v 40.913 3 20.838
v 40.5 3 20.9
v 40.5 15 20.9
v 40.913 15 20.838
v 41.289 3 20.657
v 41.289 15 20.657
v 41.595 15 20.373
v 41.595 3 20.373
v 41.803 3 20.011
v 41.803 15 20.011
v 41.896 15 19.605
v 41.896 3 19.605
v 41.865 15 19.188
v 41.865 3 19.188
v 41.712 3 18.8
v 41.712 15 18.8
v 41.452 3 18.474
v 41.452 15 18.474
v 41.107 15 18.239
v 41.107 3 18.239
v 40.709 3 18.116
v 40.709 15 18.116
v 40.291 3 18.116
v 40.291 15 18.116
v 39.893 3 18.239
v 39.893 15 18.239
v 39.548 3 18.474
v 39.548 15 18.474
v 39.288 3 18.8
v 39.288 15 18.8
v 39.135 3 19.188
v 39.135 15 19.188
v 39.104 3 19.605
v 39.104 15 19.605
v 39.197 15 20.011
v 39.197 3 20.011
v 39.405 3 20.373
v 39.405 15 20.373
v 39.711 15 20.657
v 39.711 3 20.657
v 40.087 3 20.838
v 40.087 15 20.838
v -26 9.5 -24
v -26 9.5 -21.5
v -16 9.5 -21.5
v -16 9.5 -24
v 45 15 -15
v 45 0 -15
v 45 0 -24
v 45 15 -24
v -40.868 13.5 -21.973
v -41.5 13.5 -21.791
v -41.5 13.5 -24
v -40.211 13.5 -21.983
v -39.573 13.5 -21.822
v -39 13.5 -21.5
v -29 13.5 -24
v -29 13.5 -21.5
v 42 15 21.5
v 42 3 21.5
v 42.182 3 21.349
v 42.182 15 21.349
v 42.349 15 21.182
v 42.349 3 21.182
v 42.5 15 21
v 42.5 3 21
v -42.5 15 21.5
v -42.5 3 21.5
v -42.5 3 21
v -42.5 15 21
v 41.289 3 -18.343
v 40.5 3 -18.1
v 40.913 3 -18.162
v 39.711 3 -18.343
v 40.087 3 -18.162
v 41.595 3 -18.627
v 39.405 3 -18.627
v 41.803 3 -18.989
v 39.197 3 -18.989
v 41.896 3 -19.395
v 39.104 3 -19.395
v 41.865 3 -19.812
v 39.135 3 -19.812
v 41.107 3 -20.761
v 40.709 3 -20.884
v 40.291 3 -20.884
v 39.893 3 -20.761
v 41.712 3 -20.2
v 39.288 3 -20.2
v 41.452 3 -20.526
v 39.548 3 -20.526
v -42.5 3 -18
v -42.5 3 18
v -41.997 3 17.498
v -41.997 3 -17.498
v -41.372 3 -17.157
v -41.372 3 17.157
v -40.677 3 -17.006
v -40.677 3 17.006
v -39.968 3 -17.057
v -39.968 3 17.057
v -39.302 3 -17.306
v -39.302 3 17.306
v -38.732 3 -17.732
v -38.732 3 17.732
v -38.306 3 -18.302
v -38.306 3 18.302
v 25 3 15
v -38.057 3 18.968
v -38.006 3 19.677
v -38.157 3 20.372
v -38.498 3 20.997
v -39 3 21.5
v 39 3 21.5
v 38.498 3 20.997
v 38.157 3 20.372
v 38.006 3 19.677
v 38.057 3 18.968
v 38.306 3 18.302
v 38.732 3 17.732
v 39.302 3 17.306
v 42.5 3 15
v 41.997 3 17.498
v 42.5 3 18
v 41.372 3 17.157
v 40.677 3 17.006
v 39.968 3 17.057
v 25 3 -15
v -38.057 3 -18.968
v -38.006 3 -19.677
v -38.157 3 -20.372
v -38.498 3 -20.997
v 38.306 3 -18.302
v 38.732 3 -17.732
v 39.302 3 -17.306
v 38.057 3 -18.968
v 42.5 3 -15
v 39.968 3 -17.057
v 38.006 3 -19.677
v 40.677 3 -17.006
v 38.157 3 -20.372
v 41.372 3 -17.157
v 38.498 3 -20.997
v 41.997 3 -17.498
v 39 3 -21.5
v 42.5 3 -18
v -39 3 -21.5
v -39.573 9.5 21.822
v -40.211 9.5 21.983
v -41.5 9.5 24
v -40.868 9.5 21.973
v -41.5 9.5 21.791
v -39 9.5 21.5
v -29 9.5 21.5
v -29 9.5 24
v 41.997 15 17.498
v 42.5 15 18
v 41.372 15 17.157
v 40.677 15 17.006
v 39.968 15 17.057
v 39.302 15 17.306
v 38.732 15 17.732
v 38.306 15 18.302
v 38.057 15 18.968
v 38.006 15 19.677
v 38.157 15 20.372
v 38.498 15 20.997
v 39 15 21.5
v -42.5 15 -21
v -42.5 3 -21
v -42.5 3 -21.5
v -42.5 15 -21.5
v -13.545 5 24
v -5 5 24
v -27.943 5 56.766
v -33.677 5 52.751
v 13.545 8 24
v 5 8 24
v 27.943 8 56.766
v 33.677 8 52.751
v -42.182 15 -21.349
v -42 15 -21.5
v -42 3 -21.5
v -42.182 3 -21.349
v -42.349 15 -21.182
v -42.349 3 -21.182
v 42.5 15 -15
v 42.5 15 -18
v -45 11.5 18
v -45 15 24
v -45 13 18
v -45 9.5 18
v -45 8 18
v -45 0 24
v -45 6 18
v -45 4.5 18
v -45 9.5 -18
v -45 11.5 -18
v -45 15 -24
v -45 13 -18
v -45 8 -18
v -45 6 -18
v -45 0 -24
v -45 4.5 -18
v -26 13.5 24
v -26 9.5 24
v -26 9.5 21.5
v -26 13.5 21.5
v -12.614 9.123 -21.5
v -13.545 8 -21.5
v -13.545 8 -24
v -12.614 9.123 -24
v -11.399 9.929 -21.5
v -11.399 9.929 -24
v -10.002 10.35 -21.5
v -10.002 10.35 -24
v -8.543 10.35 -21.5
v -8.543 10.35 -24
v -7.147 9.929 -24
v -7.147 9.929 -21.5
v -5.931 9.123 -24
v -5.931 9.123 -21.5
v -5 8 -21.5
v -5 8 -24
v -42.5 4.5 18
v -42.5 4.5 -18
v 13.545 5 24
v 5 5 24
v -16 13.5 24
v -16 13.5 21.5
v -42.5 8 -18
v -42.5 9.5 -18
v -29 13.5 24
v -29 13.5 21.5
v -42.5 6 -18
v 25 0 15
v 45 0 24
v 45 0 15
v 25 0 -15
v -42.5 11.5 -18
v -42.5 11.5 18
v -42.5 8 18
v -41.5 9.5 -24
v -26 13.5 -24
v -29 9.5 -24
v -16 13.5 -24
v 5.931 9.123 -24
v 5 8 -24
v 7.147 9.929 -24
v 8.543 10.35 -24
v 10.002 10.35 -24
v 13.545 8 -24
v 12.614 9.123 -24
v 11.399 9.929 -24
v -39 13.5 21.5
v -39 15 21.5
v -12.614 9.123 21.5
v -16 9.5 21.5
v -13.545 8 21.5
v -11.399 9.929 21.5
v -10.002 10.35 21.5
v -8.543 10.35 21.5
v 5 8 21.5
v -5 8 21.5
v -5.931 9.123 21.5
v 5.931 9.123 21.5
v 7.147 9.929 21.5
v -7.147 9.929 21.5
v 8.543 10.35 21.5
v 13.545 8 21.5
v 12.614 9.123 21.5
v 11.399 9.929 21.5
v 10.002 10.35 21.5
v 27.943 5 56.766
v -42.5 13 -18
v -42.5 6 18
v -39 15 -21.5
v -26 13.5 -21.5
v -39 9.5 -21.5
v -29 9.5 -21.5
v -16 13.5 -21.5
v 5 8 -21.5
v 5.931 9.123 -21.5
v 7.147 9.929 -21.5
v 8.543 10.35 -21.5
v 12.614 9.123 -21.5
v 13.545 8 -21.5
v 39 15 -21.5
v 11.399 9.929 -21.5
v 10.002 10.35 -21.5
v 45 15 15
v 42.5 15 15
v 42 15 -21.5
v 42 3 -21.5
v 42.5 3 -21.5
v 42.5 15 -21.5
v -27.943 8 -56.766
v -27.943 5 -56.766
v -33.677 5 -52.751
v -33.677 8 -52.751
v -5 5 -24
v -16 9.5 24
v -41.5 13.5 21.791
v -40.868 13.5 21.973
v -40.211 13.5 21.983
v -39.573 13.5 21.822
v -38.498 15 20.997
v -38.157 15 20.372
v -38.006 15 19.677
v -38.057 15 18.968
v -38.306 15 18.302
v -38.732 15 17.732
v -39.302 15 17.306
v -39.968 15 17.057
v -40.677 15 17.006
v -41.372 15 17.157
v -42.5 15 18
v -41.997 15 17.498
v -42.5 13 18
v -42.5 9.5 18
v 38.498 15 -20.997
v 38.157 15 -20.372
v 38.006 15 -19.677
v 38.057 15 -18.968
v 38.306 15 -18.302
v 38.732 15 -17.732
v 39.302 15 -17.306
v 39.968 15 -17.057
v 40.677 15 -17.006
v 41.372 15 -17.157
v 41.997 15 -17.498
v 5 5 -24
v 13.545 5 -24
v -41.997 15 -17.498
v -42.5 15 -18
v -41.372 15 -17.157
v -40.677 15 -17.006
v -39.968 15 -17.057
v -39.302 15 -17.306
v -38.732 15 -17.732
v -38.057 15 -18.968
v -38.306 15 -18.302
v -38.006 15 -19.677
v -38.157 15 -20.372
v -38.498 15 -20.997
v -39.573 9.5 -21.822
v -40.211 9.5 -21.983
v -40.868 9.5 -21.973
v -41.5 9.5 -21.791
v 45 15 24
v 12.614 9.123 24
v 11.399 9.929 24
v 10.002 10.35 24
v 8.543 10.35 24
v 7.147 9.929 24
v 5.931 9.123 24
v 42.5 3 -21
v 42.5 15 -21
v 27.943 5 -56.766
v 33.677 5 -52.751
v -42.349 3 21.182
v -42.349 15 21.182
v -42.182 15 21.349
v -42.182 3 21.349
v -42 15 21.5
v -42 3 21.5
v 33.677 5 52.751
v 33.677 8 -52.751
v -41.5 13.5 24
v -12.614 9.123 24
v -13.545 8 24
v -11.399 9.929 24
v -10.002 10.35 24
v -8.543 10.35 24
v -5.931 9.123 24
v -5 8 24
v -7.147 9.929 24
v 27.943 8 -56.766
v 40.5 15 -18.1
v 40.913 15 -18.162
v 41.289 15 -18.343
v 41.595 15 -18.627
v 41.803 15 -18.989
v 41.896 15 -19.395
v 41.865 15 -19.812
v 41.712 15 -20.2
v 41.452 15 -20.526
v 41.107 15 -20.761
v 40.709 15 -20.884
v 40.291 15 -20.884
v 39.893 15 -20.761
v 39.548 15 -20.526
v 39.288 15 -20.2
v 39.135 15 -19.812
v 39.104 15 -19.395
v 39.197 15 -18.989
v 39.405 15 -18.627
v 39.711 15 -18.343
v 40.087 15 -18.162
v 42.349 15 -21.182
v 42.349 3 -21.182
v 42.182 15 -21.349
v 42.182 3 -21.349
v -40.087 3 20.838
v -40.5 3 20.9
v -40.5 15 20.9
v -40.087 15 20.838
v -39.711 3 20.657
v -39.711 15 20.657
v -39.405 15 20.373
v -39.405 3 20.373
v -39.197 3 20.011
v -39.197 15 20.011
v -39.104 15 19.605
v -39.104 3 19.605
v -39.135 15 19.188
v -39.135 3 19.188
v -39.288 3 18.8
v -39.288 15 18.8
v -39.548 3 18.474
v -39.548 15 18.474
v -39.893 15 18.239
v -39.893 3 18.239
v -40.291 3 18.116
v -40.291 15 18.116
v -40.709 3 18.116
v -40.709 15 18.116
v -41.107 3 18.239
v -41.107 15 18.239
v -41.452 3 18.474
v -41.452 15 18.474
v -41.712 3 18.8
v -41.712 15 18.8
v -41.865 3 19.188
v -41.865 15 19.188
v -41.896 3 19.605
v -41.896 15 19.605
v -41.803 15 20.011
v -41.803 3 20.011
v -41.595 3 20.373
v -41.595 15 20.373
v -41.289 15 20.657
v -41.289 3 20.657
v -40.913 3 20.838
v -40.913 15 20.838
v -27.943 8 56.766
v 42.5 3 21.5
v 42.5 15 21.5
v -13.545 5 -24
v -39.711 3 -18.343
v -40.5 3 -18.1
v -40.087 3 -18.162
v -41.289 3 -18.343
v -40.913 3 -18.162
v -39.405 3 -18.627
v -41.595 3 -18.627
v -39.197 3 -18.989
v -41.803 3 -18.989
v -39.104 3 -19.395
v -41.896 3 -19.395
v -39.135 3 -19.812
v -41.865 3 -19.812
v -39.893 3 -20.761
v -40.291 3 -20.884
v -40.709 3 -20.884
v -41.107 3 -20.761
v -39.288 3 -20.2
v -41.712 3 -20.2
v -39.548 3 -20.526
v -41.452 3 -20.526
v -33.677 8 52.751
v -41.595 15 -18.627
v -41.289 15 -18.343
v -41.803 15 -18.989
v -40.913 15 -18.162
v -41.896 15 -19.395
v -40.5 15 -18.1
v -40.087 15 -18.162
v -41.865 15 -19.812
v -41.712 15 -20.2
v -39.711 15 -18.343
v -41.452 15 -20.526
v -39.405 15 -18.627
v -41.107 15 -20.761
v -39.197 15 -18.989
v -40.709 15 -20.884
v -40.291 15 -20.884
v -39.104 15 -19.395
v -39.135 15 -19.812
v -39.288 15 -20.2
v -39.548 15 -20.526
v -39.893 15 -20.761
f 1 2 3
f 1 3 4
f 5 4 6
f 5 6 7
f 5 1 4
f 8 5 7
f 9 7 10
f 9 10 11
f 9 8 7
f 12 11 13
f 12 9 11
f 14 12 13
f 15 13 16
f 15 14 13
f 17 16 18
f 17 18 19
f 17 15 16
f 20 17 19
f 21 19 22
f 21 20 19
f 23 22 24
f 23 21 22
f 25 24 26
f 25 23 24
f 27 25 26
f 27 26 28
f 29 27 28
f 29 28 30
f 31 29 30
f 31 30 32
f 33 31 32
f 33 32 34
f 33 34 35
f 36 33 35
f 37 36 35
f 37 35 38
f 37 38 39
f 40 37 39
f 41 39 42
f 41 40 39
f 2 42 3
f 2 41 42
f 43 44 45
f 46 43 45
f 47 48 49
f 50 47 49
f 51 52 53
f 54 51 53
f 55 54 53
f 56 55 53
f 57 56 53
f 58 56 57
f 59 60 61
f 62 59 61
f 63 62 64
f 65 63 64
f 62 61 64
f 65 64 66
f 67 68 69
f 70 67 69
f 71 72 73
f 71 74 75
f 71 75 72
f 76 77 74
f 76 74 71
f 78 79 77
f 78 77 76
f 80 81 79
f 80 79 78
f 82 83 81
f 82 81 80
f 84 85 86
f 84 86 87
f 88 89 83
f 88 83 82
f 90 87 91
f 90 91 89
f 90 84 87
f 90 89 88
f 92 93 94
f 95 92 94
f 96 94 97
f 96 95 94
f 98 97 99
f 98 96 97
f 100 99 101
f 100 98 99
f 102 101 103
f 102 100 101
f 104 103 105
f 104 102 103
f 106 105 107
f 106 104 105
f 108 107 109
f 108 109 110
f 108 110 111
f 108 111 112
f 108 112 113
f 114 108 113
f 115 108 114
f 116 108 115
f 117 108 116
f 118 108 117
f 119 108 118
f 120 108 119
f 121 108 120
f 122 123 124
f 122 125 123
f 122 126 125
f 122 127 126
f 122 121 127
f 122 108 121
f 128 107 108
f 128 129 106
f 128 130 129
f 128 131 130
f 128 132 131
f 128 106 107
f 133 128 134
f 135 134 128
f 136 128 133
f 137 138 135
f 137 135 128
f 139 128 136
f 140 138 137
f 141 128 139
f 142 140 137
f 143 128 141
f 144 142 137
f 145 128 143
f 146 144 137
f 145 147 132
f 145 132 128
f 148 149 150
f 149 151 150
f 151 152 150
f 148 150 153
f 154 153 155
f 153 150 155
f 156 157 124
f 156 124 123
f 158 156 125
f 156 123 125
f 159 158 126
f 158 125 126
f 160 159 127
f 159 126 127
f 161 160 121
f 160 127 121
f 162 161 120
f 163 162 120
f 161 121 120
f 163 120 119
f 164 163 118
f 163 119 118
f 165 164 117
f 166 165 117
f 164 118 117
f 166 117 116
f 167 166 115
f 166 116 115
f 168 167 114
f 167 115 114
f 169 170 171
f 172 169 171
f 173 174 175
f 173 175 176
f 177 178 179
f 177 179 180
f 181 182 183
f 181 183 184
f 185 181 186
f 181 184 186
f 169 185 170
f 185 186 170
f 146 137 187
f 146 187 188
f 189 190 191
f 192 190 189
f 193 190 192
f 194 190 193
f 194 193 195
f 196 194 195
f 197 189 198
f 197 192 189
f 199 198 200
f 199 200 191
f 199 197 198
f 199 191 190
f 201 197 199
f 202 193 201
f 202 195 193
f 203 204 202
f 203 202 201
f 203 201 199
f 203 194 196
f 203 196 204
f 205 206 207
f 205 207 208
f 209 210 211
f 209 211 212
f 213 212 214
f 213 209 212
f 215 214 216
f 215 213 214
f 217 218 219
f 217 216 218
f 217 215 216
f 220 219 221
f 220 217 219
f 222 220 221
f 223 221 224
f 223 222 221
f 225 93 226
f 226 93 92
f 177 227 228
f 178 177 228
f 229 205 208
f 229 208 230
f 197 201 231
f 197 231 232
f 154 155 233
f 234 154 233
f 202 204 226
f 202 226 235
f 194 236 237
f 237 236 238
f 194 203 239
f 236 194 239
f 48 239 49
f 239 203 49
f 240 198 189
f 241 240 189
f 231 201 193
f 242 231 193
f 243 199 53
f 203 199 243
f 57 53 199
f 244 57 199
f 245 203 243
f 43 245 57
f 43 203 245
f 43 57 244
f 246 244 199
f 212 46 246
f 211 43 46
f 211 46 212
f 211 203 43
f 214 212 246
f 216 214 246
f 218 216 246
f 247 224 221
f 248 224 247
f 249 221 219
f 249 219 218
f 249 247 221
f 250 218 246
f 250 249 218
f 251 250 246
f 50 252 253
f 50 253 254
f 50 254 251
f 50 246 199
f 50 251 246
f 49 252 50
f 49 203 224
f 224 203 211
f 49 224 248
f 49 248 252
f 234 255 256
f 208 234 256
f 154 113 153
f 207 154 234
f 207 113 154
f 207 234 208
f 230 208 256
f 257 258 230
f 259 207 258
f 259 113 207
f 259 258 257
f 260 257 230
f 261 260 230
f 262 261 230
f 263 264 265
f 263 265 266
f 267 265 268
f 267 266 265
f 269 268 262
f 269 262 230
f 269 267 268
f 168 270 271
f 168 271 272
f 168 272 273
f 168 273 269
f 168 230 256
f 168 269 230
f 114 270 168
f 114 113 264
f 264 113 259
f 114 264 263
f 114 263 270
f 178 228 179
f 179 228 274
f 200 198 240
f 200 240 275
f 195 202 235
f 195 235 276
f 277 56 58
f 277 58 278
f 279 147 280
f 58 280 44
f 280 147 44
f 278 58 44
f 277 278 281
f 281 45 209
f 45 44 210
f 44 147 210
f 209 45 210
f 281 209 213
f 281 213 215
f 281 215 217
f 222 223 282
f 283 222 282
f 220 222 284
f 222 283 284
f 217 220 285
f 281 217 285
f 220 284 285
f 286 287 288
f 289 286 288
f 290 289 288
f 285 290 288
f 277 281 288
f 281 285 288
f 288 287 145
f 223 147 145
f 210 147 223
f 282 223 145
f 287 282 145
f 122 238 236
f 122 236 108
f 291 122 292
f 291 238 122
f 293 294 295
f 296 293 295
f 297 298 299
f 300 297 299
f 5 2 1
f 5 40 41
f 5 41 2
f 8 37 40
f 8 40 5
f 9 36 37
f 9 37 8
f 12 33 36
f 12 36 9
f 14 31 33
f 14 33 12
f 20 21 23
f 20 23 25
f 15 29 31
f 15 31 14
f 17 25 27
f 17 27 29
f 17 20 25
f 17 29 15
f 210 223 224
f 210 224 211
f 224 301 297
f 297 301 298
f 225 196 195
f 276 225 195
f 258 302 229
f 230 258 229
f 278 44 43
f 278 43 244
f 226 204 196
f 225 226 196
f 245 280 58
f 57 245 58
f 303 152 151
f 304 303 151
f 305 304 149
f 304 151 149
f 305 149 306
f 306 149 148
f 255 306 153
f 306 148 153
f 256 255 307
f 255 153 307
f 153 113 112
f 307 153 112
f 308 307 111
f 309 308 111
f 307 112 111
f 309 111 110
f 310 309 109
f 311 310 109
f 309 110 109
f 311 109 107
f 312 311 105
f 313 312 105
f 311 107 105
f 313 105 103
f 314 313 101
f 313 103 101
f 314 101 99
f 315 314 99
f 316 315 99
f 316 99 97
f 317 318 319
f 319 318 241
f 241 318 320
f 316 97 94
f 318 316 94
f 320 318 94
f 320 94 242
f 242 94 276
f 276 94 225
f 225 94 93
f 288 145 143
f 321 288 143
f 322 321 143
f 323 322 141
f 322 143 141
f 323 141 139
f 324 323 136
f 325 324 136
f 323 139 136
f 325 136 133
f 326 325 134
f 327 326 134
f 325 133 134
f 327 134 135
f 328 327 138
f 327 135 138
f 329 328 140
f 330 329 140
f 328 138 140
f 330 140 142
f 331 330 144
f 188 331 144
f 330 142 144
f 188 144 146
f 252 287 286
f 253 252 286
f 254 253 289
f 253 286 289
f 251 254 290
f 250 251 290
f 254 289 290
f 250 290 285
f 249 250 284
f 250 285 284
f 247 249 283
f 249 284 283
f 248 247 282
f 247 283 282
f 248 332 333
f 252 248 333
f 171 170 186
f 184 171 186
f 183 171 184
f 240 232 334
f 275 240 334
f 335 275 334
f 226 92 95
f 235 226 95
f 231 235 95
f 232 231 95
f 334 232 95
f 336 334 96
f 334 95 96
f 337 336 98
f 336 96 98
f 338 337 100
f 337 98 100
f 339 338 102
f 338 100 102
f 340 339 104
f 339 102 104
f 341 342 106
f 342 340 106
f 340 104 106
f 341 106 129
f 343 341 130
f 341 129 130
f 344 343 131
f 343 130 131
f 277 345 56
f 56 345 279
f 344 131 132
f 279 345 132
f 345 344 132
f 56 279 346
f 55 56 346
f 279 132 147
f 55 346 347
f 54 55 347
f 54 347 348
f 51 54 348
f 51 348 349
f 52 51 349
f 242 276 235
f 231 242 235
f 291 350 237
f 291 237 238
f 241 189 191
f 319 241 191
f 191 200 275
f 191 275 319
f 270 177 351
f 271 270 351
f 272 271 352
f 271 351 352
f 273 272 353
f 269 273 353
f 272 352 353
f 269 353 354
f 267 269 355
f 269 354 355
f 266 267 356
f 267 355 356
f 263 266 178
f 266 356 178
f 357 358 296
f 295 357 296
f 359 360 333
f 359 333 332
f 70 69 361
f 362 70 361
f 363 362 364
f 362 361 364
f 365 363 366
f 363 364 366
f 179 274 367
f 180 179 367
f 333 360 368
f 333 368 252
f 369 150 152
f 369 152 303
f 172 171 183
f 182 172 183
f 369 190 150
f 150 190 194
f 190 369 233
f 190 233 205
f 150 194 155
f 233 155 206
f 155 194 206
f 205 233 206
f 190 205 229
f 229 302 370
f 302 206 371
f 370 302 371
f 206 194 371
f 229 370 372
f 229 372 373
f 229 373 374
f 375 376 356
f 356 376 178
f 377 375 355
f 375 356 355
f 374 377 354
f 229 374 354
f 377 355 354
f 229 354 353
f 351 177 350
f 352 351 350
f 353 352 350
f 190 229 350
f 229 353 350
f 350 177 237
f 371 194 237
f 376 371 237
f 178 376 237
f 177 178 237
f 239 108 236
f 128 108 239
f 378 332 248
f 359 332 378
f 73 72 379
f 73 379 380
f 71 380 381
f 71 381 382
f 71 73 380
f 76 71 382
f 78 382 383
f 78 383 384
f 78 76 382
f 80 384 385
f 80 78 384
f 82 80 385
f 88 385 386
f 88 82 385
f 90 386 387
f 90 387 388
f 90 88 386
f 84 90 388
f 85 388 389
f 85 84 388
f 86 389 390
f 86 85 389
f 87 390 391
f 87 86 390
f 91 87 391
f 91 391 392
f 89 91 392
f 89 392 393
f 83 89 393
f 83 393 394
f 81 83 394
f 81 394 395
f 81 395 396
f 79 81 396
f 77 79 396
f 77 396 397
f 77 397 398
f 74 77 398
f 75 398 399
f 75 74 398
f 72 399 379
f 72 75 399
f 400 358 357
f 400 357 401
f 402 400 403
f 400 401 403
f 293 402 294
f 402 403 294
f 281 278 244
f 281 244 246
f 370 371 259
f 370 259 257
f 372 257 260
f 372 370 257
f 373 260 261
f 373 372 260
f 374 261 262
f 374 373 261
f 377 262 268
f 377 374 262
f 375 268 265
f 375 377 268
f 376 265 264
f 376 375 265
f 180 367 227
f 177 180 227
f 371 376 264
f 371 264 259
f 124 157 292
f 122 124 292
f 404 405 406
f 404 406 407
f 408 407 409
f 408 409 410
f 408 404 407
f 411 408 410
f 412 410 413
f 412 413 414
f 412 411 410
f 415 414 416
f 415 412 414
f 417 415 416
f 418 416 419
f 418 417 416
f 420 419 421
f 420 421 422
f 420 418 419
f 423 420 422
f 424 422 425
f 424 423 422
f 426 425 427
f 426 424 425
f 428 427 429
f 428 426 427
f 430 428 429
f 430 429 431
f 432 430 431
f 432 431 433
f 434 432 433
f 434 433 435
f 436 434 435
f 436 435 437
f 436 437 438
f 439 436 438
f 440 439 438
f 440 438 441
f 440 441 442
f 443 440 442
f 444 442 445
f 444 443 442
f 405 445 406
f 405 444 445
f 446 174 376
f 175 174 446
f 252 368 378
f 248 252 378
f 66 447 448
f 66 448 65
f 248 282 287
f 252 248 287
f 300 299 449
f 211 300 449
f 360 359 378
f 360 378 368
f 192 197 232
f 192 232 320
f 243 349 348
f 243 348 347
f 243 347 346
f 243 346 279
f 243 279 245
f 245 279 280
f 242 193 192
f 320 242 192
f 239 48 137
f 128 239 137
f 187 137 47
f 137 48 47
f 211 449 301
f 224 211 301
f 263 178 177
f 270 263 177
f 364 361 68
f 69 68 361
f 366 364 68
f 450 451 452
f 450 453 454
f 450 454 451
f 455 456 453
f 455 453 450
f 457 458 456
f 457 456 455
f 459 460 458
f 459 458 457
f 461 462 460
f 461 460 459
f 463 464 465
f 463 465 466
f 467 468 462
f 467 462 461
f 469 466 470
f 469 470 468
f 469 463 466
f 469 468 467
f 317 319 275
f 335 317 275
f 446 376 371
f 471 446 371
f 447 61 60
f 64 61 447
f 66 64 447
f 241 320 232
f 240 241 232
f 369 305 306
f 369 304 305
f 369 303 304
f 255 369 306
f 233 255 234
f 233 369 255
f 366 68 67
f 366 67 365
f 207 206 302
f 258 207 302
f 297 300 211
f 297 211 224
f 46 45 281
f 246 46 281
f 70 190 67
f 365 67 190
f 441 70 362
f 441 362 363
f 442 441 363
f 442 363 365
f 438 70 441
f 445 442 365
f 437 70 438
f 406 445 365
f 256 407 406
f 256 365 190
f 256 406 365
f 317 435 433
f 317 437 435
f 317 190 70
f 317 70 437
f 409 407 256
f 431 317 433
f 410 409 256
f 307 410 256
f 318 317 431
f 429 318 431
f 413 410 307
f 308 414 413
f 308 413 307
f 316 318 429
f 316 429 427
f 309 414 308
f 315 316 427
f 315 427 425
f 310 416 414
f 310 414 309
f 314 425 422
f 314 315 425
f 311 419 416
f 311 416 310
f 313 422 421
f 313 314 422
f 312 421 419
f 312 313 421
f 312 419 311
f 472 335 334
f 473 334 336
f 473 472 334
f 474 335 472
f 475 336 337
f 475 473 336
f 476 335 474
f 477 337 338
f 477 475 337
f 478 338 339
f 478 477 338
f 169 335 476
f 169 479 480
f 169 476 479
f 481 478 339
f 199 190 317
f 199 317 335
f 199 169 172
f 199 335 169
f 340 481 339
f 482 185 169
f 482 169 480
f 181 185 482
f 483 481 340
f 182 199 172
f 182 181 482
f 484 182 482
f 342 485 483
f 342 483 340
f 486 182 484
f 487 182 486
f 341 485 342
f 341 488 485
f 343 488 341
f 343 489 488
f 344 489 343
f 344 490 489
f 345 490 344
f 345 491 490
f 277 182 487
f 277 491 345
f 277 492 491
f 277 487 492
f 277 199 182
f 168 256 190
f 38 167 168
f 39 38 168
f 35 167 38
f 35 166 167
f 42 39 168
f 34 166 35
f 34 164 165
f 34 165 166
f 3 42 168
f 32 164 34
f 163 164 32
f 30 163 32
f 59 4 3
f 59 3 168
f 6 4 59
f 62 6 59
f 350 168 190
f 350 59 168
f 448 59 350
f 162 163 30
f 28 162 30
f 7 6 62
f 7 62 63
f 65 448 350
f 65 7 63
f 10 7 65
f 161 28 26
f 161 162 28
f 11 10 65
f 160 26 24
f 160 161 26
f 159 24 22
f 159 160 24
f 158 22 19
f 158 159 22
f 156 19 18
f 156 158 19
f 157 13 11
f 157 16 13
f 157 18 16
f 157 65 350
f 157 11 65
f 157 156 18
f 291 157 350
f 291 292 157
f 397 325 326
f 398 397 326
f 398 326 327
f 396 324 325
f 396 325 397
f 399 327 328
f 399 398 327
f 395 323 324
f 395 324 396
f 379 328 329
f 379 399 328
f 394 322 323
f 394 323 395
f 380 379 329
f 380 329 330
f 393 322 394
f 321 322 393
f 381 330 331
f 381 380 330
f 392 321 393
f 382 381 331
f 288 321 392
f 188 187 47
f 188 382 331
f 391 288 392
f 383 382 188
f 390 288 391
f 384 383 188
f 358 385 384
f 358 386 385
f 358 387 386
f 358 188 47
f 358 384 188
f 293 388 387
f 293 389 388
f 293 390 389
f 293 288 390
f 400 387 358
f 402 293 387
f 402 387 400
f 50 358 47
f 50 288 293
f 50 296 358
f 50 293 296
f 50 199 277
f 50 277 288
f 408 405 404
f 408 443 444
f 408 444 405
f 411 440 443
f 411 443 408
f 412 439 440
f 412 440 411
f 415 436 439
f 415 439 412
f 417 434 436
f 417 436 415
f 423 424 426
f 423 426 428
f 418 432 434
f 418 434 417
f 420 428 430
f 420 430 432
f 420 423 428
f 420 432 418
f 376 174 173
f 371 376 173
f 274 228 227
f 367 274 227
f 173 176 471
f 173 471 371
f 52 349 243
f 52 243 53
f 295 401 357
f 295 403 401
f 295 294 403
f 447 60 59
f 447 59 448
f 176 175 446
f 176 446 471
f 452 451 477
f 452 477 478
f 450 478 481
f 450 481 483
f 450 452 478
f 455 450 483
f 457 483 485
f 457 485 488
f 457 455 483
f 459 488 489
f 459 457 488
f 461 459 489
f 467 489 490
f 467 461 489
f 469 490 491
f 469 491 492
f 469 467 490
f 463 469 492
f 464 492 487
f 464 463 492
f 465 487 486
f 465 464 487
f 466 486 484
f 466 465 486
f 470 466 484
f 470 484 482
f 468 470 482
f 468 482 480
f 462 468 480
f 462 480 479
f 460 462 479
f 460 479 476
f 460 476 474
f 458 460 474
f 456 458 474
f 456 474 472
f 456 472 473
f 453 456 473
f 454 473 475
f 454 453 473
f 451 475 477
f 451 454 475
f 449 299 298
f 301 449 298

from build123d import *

# Parameters (mm, degrees)
SKICA1_W                  = 90
SKICA1_H                  = 48
P_IDAT_VYSUNUT_M1_DEPTH   = 3
P_IDAT_START              = 5
P_IDAT_VYSUNUT_M2_DEPTH   = 3
P_IDAT_VYSUNUT_M2_2_DEPTH = 3
P_IDAT_VYSUNUT_M2_3_DEPTH = 3
P_IDAT_VYSUNUT_M2_4_DEPTH = 3
SKICA3_W                  = 90
SKICA3_H                  = 48
SKICA3_W_2                = 85
SKICA3_H_2                = 43
P_IDAT_VYSUNUT_M3_DEPTH   = 12
SKICA4_W                  = 30
SKICA4_H                  = 15
ODEBRAT_VYSUNUT_M1_DEPTH  = 20
SKICA10_W                 = 12.5
SKICA10_H                 = 4
SKICA10_W_2               = 10
ODEBRAT_VYSUNUT_M5_DEPTH  = 50
SKICA11_W                 = 36
SKICA11_H                 = 1.5
ODEBRAT_VYSUNUT_M6_DEPTH  = 5
ODEBRAT_VYSUNUT_M7_DEPTH  = 50
SKICA14_R                 = 2.5
SKICA14_R_2               = 1.4
P_IDAT_VYSUNUT_M4_DEPTH   = 12


with BuildPart() as part:
    # Skica1 → Přidat vysunutím1 (new body)
    with BuildSketch(Plane(origin=(0, 0, 0), x_dir=(1, 0, 0), z_dir=(0, 1, 0))):
        Rectangle(SKICA1_W, SKICA1_H)
    extrude(amount=P_IDAT_VYSUNUT_M1_DEPTH)

    # Skica3 → Přidat vysunutím3 (add)
    with BuildSketch(Plane(origin=(0, 3, 0), x_dir=(1, 0, 0), z_dir=(0, 1, 0))):
        Rectangle(SKICA3_W, SKICA3_H)
        Rectangle(SKICA3_W_2, SKICA3_H_2, mode=Mode.SUBTRACT)
    extrude(amount=P_IDAT_VYSUNUT_M3_DEPTH)

    # Skica4 → Odebrat vysunutím1 (cut)
    with BuildSketch(Plane(origin=(45, 0, 0), x_dir=(0, 0, -1), z_dir=(1, 0, 0))):
        with Locations((0, 7.5)):
            Rectangle(SKICA4_W, SKICA4_H)
    extrude(amount=-ODEBRAT_VYSUNUT_M1_DEPTH, mode=Mode.SUBTRACT)

    # Skica10 → Odebrat vysunutím5 (cut)
    with BuildSketch(Plane.XY.offset(24)):
        with Locations((-35.25, 11.5)):
            Rectangle(SKICA10_W, SKICA10_H)
        with Locations((-21, 11.5)):
            Rectangle(SKICA10_W_2, SKICA10_H)
    extrude(amount=-ODEBRAT_VYSUNUT_M5_DEPTH, mode=Mode.SUBTRACT)

    # Skica11 → Odebrat vysunutím6 (cut)
    with BuildSketch(Plane.ZY.offset(45)):
        with Locations((0, 12.25)):
            Rectangle(SKICA11_W, SKICA11_H)
        with Locations((0, 8.75)):
            Rectangle(SKICA11_W, SKICA11_H)
        with Locations((0, 5.25)):
            Rectangle(SKICA11_W, SKICA11_H)
    extrude(amount=-ODEBRAT_VYSUNUT_M6_DEPTH, mode=Mode.SUBTRACT)

    # Skica12 → Odebrat vysunutím7 (cut)
    with BuildSketch(Plane.XY.offset(24)):
        with BuildLine():
            Line((-5, 8), (-13.545422121, 8))
            ThreePointArc((-13.545422121, 8), (-9.272711061, 10.403090261), (-5, 8))
        make_face()
        with BuildLine():
            Line((5, 8), (13.545422121, 8))
            ThreePointArc((13.545422121, 8), (9.272711061, 10.403090261), (5, 8))
        make_face()
    extrude(amount=-ODEBRAT_VYSUNUT_M7_DEPTH, mode=Mode.SUBTRACT)

    # Skica14 → Přidat vysunutím4 (add)
    # profile 1 of 4: a face of its own
    with BuildSketch(Plane(origin=(0, 3, 0), x_dir=(1, 0, 0), z_dir=(0, 1, 0))):
        with Locations((-40.5, 19.5)):
            Circle(SKICA14_R)
        with Locations(Location((-40.5, 19.5, 0), (0, 0, 270))):
            Circle(SKICA14_R_2, mode=Mode.SUBTRACT)
    # profile 2 of 4: a face of its own
    with BuildSketch(Plane(origin=(0, 3, 0), x_dir=(1, 0, 0), z_dir=(0, 1, 0))):
        with Locations((-40.5, -19.5)):
            Circle(SKICA14_R)
        with Locations(Location((-40.5, -19.5, 0), (0, 0, 270))):
            Circle(SKICA14_R_2, mode=Mode.SUBTRACT)
    # profile 3 of 4: a face of its own
    with BuildSketch(Plane(origin=(0, 3, 0), x_dir=(1, 0, 0), z_dir=(0, 1, 0))):
        with Locations((40.5, -19.5)):
            Circle(SKICA14_R)
        with Locations(Location((40.5, -19.5, 0), (0, 0, 270))):
            Circle(SKICA14_R_2, mode=Mode.SUBTRACT)
    # profile 4 of 4: a face of its own
    with BuildSketch(Plane(origin=(0, 3, 0), x_dir=(1, 0, 0), z_dir=(0, 1, 0))):
        with Locations((40.5, 19.5)):
            Circle(SKICA14_R)
        with Locations(Location((40.5, 19.5, 0), (0, 0, 270))):
            Circle(SKICA14_R_2, mode=Mode.SUBTRACT)
    extrude(amount=P_IDAT_VYSUNUT_M4_DEPTH)


with BuildPart() as body_2:
    # Skica2 → Přidat vysunutím2 (new body)
    with BuildSketch(Plane(origin=(0, 0, 0), x_dir=(1, 0, 0), z_dir=(0, 1, 0)).offset(P_IDAT_START)):
        Polygon((-33.677121764, -52.751046717), (-13.545422121, -24), (-11.103872944, -24), (-5, -24), (-27.943057454, -56.766081772), align=None)
    extrude(amount=P_IDAT_VYSUNUT_M2_DEPTH)


with BuildPart() as body_3:
    # Skica2 → P_idat vysunut_m2 2 (new body)
    with BuildSketch(Plane(origin=(0, 0, 0), x_dir=(1, 0, 0), z_dir=(0, 1, 0)).offset(P_IDAT_START)):
        Polygon((5, -24), (27.943057454, -56.766081772), (33.677121764, -52.751046717), (13.545422121, -24), (11.103872944, -24), align=None)
    extrude(amount=P_IDAT_VYSUNUT_M2_2_DEPTH)


with BuildPart() as body_4:
    # Skica2 → P_idat vysunut_m2 3 (new body)
    with BuildSketch(Plane(origin=(0, 0, 0), x_dir=(1, 0, 0), z_dir=(0, 1, 0)).offset(P_IDAT_START)):
        Polygon((-5, 24), (-27.943057454, 56.766081772), (-33.677121764, 52.751046717), (-13.545422121, 24), (-11.103872944, 24), align=None)
    extrude(amount=P_IDAT_VYSUNUT_M2_3_DEPTH)


with BuildPart() as body_5:
    # Skica2 → P_idat vysunut_m2 4 (new body)
    with BuildSketch(Plane(origin=(0, 0, 0), x_dir=(1, 0, 0), z_dir=(0, 1, 0)).offset(P_IDAT_START)):
        Polygon((5, 24), (27.943057454, 56.766081772), (33.677121764, 52.751046717), (13.545422121, 24), (11.103872944, 24), align=None)
    extrude(amount=P_IDAT_VYSUNUT_M2_4_DEPTH)


solid = Compound([part.part, body_2.part, body_3.part, body_4.part, body_5.part])
